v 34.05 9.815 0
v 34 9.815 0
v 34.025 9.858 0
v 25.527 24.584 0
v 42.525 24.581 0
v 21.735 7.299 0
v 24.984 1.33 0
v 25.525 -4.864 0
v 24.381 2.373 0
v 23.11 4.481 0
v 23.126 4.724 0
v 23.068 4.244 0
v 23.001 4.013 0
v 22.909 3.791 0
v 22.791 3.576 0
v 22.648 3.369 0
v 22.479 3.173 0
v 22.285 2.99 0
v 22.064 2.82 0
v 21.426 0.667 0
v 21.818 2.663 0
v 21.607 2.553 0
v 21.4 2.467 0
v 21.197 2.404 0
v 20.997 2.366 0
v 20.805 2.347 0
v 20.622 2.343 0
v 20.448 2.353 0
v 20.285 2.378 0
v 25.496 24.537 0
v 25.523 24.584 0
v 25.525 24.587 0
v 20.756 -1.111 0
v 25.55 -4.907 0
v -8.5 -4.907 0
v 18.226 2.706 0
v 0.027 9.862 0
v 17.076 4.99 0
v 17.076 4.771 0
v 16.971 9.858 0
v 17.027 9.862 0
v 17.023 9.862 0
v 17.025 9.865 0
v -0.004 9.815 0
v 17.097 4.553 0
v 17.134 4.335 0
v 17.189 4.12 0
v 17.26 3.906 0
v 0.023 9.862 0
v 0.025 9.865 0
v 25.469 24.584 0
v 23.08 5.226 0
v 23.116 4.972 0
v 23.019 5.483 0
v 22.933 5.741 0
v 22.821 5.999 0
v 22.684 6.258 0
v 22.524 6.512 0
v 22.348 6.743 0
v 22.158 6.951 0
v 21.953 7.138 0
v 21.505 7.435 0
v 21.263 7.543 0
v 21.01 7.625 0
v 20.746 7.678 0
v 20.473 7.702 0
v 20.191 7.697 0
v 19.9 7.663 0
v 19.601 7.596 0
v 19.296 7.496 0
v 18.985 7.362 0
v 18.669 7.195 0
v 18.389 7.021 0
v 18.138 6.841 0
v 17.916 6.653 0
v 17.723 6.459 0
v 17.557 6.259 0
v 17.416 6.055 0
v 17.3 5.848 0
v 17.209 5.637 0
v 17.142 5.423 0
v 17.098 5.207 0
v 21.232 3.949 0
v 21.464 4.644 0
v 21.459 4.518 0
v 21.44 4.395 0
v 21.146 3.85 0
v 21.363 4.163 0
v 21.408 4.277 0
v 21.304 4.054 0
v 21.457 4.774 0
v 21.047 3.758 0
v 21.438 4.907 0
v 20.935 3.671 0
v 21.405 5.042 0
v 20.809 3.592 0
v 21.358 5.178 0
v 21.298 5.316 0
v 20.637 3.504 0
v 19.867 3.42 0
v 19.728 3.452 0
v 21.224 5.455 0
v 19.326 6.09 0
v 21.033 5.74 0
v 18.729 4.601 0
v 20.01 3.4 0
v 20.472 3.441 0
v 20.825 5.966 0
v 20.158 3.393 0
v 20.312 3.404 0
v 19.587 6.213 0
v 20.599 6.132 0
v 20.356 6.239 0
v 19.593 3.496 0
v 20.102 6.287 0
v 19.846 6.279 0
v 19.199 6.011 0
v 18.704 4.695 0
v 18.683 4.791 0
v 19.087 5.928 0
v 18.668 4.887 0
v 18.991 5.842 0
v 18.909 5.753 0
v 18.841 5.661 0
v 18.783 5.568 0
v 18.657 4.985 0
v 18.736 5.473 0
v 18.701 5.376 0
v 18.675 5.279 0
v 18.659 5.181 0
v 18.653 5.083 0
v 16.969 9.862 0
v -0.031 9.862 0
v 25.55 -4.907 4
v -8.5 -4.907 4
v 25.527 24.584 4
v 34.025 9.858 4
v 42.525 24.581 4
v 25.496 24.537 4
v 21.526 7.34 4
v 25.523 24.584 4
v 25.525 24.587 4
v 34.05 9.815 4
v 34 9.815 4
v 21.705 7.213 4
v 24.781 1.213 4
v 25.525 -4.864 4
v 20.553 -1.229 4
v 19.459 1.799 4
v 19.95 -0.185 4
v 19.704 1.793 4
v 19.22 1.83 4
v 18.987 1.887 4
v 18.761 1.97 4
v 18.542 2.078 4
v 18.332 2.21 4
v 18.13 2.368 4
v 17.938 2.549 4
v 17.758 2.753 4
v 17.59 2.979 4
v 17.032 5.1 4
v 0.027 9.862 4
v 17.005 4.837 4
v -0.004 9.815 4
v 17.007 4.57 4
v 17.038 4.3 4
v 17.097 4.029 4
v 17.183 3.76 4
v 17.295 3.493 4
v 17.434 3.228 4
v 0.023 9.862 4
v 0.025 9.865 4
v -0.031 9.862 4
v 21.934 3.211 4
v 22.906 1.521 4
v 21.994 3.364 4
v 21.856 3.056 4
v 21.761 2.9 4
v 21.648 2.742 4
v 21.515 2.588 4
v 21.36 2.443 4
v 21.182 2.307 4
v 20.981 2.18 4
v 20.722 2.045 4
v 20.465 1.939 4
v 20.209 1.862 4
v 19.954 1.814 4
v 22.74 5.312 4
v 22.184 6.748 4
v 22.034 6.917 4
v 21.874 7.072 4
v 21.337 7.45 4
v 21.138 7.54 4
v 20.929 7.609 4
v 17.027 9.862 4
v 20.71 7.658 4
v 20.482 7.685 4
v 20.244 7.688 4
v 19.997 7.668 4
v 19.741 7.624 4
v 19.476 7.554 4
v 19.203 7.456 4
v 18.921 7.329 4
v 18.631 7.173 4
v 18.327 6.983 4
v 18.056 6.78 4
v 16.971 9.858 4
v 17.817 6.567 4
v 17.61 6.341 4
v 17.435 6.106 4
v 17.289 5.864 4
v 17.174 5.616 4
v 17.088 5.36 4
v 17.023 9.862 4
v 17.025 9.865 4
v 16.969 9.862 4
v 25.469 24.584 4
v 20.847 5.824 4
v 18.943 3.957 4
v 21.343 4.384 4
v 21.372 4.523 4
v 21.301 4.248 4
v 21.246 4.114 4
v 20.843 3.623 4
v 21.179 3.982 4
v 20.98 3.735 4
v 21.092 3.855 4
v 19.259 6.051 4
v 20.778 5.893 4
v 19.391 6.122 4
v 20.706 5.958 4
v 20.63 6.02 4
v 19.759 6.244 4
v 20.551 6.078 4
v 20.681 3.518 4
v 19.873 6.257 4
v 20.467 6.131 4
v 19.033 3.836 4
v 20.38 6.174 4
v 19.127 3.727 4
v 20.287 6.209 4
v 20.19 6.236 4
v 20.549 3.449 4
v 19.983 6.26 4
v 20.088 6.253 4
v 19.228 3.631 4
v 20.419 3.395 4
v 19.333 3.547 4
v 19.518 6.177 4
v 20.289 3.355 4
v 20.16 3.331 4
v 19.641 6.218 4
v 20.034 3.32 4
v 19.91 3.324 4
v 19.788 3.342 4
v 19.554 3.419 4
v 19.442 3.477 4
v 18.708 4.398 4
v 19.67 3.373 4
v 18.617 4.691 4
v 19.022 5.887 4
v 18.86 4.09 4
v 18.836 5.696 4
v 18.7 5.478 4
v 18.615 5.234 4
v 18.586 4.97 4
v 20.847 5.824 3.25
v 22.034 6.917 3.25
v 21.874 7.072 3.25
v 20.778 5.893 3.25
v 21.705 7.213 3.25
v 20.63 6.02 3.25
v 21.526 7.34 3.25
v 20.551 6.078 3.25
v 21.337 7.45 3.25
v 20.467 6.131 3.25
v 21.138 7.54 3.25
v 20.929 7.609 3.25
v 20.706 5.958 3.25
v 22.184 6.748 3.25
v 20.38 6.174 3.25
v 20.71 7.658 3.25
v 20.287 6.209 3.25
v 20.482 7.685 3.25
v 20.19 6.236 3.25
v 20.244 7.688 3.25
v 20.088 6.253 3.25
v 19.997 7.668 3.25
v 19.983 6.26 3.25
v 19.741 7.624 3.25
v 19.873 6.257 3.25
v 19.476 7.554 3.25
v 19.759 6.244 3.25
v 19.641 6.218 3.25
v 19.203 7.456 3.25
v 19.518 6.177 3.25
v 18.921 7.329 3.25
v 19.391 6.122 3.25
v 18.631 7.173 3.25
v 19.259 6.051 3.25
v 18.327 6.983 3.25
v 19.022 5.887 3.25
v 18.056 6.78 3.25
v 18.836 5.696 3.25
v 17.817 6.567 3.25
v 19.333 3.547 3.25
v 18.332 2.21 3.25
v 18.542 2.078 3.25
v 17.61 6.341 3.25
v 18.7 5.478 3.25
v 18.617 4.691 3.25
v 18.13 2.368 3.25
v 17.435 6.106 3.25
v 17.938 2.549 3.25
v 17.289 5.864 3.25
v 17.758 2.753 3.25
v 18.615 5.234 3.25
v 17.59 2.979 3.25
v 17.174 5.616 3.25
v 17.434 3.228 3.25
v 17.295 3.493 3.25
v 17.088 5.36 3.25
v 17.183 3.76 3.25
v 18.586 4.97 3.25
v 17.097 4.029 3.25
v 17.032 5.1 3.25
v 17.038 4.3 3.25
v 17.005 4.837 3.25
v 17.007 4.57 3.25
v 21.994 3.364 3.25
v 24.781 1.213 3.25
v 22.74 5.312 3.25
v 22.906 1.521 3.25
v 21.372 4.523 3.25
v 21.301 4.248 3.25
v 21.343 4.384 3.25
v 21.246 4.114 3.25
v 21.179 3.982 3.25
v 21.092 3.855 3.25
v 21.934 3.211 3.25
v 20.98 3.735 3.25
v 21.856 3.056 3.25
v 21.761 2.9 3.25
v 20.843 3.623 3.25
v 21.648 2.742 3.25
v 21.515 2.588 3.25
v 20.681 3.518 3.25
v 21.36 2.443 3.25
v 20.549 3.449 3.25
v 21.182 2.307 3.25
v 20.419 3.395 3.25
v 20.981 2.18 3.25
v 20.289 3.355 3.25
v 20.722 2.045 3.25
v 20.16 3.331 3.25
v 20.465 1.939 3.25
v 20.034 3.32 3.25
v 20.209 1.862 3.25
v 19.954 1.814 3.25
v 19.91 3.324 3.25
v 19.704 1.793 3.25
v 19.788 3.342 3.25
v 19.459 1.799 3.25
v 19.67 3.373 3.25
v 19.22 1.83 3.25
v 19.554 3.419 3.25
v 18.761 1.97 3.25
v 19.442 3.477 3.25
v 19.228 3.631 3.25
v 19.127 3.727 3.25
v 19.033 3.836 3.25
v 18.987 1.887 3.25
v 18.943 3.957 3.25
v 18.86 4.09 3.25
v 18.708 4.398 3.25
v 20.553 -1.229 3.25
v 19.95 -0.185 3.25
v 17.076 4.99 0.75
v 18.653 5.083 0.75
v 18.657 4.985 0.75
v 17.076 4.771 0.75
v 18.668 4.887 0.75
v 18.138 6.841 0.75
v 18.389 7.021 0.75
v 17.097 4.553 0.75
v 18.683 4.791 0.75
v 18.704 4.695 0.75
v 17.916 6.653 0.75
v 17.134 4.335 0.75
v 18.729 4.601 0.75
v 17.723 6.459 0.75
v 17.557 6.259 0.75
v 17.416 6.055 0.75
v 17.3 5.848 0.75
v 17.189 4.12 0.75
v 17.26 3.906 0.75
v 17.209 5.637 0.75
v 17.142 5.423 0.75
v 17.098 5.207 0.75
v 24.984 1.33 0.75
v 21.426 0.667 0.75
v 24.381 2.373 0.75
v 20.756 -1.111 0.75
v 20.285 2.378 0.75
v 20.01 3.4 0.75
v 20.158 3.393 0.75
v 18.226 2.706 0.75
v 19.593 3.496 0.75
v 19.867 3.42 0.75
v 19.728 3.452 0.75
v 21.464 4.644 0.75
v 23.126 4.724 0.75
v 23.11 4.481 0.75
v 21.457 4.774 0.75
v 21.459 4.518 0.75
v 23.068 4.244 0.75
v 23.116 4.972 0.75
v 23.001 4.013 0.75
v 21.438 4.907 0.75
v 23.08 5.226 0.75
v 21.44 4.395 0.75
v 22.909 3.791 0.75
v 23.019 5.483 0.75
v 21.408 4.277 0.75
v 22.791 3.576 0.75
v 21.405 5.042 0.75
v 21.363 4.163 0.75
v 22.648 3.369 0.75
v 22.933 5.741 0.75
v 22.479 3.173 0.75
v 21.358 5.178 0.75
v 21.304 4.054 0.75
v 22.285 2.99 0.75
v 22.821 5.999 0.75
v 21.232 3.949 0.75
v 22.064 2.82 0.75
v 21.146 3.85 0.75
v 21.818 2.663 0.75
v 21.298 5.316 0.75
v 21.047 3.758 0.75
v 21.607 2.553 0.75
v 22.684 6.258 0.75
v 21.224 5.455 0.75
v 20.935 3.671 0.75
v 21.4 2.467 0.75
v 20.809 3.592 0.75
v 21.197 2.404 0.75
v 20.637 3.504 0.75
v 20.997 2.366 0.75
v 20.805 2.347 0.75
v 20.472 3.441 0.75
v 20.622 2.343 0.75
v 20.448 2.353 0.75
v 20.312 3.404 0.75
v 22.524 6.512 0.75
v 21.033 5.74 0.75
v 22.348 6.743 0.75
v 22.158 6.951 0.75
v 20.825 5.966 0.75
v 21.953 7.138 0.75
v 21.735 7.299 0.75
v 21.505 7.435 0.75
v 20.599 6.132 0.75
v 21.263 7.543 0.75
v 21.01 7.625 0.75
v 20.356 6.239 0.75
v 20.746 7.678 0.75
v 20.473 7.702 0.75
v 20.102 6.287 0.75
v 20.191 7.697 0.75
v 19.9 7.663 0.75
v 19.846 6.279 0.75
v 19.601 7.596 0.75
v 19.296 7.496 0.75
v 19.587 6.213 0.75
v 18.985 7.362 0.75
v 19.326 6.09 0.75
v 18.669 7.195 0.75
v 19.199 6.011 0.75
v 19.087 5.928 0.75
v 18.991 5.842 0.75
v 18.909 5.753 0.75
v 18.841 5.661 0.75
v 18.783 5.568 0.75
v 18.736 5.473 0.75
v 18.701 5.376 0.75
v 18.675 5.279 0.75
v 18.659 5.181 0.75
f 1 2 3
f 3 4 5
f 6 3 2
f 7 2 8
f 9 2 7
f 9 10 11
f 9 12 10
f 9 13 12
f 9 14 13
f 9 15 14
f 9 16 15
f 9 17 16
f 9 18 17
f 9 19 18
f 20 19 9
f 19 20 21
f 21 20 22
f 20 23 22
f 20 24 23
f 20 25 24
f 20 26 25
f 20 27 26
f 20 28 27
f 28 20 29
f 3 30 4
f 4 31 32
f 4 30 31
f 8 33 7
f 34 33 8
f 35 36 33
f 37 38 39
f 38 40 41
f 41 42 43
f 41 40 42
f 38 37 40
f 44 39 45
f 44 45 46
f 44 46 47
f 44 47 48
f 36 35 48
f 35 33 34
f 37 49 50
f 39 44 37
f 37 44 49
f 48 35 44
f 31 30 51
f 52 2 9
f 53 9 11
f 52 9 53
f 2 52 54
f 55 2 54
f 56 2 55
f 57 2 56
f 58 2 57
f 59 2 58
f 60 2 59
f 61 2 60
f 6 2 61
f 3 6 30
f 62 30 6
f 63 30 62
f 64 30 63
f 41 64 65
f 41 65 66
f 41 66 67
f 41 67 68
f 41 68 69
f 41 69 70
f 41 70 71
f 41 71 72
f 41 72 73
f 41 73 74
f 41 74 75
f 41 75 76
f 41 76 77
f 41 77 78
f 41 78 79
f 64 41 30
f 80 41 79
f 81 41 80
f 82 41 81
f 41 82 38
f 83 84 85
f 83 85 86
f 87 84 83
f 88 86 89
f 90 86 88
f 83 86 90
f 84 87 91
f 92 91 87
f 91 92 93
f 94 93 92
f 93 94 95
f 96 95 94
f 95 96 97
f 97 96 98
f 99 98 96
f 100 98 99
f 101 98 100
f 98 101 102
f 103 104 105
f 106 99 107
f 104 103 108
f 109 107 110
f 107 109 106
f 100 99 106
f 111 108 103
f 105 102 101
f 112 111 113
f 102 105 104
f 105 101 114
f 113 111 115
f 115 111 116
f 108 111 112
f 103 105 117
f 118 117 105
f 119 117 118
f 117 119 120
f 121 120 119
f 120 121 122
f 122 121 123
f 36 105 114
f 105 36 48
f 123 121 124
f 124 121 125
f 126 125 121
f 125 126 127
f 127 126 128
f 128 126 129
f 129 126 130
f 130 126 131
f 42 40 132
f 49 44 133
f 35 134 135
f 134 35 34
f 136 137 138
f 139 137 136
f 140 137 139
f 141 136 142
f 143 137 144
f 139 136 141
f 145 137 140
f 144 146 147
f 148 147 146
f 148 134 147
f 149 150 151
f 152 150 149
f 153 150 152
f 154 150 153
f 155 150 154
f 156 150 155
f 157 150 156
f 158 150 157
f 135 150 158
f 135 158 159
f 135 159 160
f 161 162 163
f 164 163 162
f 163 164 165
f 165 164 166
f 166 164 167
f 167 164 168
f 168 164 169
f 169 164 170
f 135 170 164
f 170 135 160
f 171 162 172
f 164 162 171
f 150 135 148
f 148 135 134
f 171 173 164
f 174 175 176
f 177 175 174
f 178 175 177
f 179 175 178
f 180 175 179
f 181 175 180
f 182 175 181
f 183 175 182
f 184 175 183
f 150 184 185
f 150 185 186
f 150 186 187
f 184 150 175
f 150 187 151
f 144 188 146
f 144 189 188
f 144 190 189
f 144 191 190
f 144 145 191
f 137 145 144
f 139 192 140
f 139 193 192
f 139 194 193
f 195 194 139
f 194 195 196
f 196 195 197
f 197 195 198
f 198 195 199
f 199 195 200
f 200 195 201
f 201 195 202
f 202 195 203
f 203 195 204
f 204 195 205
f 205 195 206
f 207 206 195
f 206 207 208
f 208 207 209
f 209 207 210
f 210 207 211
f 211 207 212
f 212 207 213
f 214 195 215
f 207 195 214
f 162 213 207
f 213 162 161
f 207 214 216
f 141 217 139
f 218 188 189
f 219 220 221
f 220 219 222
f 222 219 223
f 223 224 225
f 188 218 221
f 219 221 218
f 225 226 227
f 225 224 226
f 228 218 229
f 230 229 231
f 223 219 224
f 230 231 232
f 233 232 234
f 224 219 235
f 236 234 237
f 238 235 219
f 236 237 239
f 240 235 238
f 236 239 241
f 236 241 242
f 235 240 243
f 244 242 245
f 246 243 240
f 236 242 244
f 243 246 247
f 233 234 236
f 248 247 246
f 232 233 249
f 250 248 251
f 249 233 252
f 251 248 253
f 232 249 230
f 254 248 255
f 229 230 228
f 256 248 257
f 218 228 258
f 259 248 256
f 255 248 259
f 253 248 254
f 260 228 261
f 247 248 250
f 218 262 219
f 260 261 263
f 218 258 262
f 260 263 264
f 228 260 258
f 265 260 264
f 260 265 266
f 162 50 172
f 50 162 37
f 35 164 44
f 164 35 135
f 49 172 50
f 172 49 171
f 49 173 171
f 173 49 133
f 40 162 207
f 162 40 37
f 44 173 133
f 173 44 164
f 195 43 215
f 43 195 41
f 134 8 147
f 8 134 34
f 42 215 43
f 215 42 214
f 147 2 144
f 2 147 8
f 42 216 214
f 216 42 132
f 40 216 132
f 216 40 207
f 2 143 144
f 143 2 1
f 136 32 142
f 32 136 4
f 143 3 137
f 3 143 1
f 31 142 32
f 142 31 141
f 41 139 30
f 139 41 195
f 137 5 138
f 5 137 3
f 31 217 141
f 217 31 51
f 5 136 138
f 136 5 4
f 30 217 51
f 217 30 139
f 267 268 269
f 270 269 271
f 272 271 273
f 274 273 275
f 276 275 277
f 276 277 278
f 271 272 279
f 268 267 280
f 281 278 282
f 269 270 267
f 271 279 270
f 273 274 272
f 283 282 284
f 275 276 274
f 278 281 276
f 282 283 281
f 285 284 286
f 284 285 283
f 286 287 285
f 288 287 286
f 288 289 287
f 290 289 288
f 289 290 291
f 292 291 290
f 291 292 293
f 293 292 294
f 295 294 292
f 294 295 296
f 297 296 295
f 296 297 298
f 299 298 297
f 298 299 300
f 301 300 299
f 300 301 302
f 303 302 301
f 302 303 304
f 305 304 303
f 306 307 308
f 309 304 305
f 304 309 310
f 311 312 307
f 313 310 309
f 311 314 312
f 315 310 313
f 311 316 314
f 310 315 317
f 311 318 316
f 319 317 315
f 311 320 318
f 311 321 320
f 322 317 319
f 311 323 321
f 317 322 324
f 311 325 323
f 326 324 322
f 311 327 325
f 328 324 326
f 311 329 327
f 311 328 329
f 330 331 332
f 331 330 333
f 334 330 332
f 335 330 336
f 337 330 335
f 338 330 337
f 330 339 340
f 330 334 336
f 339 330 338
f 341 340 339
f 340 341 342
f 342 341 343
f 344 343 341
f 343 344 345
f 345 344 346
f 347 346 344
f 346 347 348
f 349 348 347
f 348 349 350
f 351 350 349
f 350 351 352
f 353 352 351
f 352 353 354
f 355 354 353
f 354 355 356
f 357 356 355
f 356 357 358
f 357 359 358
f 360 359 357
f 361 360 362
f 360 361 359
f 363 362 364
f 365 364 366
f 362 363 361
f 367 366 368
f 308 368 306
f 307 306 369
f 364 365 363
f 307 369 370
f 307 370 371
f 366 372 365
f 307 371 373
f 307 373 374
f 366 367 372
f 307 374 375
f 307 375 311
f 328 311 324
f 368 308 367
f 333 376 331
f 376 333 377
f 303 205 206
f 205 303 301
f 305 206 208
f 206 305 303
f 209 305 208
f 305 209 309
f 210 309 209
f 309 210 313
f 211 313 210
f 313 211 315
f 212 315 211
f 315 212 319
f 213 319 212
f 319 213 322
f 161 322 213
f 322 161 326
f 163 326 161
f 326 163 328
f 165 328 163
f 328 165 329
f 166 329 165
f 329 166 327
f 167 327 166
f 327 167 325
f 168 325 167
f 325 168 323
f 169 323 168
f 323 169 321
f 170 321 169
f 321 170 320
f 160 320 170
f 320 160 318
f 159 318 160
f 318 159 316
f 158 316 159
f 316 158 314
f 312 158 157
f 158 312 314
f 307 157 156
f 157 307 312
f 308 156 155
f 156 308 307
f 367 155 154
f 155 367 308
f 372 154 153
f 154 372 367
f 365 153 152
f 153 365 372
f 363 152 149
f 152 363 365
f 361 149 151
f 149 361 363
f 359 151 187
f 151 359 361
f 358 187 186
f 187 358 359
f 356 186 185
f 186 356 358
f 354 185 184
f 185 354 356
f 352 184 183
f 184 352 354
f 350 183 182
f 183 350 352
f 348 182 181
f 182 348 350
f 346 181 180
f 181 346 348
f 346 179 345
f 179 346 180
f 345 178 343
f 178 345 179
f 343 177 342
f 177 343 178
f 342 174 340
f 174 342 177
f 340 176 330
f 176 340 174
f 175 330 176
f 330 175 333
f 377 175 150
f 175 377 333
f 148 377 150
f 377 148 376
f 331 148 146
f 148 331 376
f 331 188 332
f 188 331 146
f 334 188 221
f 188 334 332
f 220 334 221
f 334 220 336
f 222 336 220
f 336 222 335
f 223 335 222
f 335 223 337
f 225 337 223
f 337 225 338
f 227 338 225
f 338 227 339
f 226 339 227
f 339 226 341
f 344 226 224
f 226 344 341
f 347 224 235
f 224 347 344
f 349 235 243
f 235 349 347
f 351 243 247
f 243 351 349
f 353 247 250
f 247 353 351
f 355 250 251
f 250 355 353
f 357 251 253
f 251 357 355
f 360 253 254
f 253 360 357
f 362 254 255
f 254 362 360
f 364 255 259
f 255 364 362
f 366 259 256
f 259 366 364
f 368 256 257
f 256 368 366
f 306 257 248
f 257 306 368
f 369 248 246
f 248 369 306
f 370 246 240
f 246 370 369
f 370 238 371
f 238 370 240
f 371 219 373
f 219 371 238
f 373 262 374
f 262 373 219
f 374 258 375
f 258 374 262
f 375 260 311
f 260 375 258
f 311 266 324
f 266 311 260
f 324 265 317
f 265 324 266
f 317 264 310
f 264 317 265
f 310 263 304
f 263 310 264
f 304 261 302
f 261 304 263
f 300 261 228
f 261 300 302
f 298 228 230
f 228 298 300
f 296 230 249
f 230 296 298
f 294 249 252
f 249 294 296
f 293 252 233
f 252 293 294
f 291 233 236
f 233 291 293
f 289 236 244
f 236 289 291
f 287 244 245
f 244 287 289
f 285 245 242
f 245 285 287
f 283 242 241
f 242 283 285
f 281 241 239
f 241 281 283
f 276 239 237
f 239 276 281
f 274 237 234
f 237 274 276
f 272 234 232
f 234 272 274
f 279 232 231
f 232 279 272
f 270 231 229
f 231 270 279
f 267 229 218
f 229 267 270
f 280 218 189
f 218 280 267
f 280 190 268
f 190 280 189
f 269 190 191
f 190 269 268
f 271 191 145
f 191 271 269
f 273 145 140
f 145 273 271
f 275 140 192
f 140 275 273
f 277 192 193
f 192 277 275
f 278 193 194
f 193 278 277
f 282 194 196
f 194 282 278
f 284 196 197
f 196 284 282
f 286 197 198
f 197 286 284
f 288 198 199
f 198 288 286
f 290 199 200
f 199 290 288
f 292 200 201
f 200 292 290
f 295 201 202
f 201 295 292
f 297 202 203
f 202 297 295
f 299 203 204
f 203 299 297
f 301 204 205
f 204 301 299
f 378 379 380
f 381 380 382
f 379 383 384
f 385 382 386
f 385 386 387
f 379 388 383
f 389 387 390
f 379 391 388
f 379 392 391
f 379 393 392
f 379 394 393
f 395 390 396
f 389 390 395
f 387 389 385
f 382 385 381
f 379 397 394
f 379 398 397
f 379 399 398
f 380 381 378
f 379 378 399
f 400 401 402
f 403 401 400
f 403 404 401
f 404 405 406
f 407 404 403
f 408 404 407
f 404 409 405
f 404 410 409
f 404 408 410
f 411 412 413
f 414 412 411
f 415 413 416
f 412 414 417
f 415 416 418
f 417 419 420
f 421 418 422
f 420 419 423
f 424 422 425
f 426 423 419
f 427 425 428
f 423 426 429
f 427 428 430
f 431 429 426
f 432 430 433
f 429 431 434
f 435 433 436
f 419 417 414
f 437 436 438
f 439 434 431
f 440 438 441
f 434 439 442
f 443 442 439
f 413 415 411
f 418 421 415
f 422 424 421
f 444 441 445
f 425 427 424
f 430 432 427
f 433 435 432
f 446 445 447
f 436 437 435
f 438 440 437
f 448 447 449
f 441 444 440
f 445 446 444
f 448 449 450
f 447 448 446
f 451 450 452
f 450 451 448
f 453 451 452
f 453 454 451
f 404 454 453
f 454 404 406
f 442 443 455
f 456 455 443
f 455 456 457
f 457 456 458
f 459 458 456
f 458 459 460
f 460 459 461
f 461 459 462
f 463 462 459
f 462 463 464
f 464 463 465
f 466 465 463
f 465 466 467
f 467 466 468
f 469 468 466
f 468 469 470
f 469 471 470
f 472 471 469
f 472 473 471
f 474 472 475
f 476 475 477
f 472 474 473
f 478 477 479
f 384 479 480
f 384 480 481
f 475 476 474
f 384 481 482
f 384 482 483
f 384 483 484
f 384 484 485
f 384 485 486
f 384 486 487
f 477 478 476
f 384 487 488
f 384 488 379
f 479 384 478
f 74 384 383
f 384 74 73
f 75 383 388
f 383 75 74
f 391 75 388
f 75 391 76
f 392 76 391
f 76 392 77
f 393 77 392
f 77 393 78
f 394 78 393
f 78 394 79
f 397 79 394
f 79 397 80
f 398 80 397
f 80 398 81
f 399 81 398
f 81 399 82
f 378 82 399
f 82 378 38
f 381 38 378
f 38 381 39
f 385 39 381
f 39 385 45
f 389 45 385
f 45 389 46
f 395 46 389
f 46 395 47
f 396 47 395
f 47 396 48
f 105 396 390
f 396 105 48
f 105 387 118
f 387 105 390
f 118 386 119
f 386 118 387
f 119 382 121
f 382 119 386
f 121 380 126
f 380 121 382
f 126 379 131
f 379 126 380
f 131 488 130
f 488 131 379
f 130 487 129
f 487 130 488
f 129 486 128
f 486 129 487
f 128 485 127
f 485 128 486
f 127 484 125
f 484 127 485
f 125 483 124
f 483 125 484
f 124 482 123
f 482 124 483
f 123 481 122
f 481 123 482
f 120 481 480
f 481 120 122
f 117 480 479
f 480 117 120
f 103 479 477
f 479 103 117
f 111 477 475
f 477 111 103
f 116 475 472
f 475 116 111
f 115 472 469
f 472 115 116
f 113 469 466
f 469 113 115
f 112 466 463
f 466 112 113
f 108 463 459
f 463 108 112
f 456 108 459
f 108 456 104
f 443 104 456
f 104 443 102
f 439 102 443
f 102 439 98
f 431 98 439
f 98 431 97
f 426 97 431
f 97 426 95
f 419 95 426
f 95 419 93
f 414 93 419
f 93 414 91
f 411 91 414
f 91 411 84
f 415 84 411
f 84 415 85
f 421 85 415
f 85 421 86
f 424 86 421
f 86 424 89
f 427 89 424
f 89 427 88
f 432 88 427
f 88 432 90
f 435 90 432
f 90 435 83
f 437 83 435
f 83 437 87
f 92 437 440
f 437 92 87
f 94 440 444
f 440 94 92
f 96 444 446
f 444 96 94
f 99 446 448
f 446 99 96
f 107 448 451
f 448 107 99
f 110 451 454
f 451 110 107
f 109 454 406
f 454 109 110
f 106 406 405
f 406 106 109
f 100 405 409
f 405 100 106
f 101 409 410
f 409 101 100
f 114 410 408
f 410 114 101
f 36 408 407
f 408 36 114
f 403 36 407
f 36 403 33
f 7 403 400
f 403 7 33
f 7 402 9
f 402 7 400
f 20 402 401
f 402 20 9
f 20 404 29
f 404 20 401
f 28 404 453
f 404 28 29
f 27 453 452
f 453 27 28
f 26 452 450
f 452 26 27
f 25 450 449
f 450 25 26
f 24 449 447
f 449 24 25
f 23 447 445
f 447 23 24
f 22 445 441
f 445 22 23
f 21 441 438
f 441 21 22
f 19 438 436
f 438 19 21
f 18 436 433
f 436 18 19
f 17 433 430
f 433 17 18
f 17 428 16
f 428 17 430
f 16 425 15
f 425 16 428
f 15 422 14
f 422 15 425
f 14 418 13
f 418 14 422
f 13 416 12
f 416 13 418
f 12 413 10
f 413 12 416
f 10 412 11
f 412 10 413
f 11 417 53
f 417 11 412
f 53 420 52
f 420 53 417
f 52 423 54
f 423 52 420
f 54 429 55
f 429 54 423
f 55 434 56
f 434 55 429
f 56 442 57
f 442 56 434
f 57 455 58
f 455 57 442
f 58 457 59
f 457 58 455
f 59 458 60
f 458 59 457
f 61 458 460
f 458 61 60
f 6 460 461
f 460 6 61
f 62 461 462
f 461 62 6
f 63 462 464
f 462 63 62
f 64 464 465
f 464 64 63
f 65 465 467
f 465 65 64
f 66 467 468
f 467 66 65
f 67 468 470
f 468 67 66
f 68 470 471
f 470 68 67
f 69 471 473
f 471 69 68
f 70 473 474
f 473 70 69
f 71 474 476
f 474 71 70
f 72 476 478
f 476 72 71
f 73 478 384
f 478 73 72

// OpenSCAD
// expects parameter N of <1,7>
// example use: "c:\Program Files\OpenSCAD\openscad.com" -o stl\tile_3.stl -D "N=3" cmdline_element.scad

/* config */
height = 4;
halfsize = 17 / 2;
fontHeight = 0.8;
fontFactor = 1;
eps = 0.05;

/* request */
N = 5;

if (N == 0) {
    test_tile();
}
if (N == 1) {
    tile1();
} else if (N == 2) {
    tile2();
} else if (N == 3) {
    tile3();
} else if (N == 4) {
    tile4();
} else if (N == 5) {
    tile5();
} else if (N == 6) {
    tile6();
} else if (N == 7) {
    tile7();
}


/* code */
fontSize = halfsize * fontFactor;
yDim = sqrt(3) * halfsize;
yShift = yDim / 3;



module triangle() {
    translate([-halfsize, -yShift, 0])            
    linear_extrude(height)
        polygon(points=[[0,0],[2*halfsize + eps,0],[halfsize + eps / 2, yDim + eps]]);
    
}

module test_tile() { //brown
    triangle();
    text("0", font = "Liberation Sans:style=Bold", size = fontSize, halign = "center", valign = "center");
}

module number(trans = [0,0,0], rot = 0, num = 0) {
    
    translate([0,0,height -fontHeight + eps]) translate(trans) rotate([0,0,rot]) linear_extrude(fontHeight)
         text(num, font = "Liberation Sans:style=Bold", size = fontSize, halign = "center", valign = "center"); 

    translate([0,0,- eps]) translate(trans) rotate([0,0,rot]) linear_extrude(fontHeight) mirror([1,0,0])
         text(num, font = "Liberation Sans:style=Bold", size = fontSize, halign = "center", valign = "center"); 
}

module tile1() { //brown
    difference() {
        union() {
            translate([   -halfsize, yShift, 0]) rotate([0, 0, 60]) triangle();
            translate([           0,      0, 0]) rotate([0, 0,  0]) triangle();
            translate([    halfsize, yShift, 0]) rotate([0, 0, 60]) triangle();
            translate([2 * halfsize,      0, 0]) rotate([0, 0,  0]) triangle();
            translate([halfsize, yDim, 0]) rotate([0, 0,  0]) triangle();
            translate([2 * halfsize, yShift + yDim, 0]) rotate([0, 0, 60]) triangle();
        }

        // translate([halfsize, yShift, height - fontHeight + eps]) rotate([0,0, 90]) linear_extrude(fontHeight)
        //     text("1", font = "Liberation Sans:style=Bold", size = fontSize, halign = "center", valign = "center");        
        number([halfsize, yShift, 0], 90, "1");
    }
    
}
module tile2() { //violet
    difference() {
        union() {
            translate([           0,      0, 0]) rotate([0, 0,  0]) triangle();
            translate([    halfsize, yShift, 0]) rotate([0, 0, 60]) triangle();
            translate([2 * halfsize,      0, 0]) rotate([0, 0,  0]) triangle();
            translate([3 * halfsize, yShift, 0]) rotate([0, 0, 60]) triangle();
            translate([3 * halfsize,   yDim, 0]) rotate([0, 0,  0]) triangle();
            translate([2 * halfsize, yShift + yDim, 0]) rotate([0, 0, 60]) triangle();
        }
        // translate([2.75 * halfsize, 1.5 *yShift, height - fontHeight + eps]) rotate([0,0, 270]) linear_extrude(fontHeight)
        //     text("2", font = "Liberation Sans:style=Bold", size = fontSize, halign = "center", valign = "center");
        number([2.75 * halfsize, 1.5 *yShift, 0], 270, "2");
    }
}
module tile3() { //sand
    difference() {
        union() {

            translate([    halfsize, yShift, 0]) rotate([0, 0, 60]) triangle();
            translate([2 * halfsize,      0, 0]) rotate([0, 0,  0]) triangle();
            translate([3 * halfsize, yShift, 0]) rotate([0, 0, 60]) triangle();
            translate([3 * halfsize,   yDim, 0]) rotate([0, 0,  0]) triangle();
            translate([4 * halfsize, yShift + yDim, 0]) rotate([0, 0, 60]) triangle();
            translate([5 * halfsize,   yDim, 0]) rotate([0, 0,  0]) triangle();
        }

        // translate([3 * halfsize, 2 * yShift, height - fontHeight + eps]) rotate([0,0, 315]) linear_extrude(fontHeight)
        //     text("3", font = "Liberation Sans:style=Bold", size = fontSize, halign = "center", valign = "center");
        number([3 * halfsize, 2 * yShift, 0], 315, "3");
    }
}
module tile4() { //yellow
    difference() {
        union() {

            translate([   -halfsize, yShift, 0]) rotate([0, 0, 60]) triangle();
            translate([           0,      0, 0]) rotate([0, 0,  0]) triangle();
            translate([    halfsize, yShift, 0]) rotate([0, 0, 60]) triangle();
            translate([2 * halfsize,      0, 0]) rotate([0, 0,  0]) triangle();
            translate([3 * halfsize, yShift, 0]) rotate([0, 0, 60]) triangle();
            translate([3 * halfsize,   yDim, 0]) rotate([0, 0,  0]) triangle();
        }

        // translate([ halfsize, yShift / 2, height - fontHeight + eps]) rotate([0,0, 0]) linear_extrude(fontHeight)
        //     text("4", font = "Liberation Sans:style=Bold", size = fontSize, halign = "center", valign = "center");
        number([ halfsize, yShift / 2, 0], 0, "4");
    }
}
module tile5() { //green
    difference() {
        union() {
            translate([           0,      0, 0]) rotate([0, 0,  0]) triangle();
            translate([    halfsize, yShift, 0]) rotate([0, 0, 60]) triangle();
            translate([2 * halfsize,      0, 0]) rotate([0, 0,  0]) triangle();
            translate([3 * halfsize, yShift, 0]) rotate([0, 0, 60]) triangle();
            translate([3 * halfsize,   yDim, 0]) rotate([0, 0,  0]) triangle();
            translate([4 * halfsize, yShift + yDim, 0]) rotate([0, 0, 60]) triangle();
        }

        // translate([2.5 * halfsize - 0.12 * yShift, 0.754 *yShift, height - fontHeight + eps]) rotate([0,0, 210]) linear_extrude(fontHeight)
        //         text("5", font = "Liberation Sans:style=Bold", size = fontSize, halign = "center", valign = "center");
        number([2.5 * halfsize - 0.12 * yShift, 0.754 *yShift, 0], 210, "5");
    }
}
module tile6() { //green
    difference() {
        union() {
            translate([   -halfsize,     yShift, 0]) rotate([0, 0, 60]) triangle();
            translate([           0,          0, 0]) rotate([0, 0,  0]) triangle();
            translate([    halfsize,     yShift, 0]) rotate([0, 0, 60]) triangle();
            translate([2 * halfsize,          0, 0]) rotate([0, 0,  0]) triangle();
            translate([3 * halfsize,     yShift, 0]) rotate([0, 0, 60]) triangle();
            translate([2 * halfsize, -2 *yShift, 0]) rotate([0, 0, 60]) triangle();
        }

        // translate([2 * halfsize, 0.5 *yShift, height - fontHeight + eps]) rotate([0,0, 270]) linear_extrude(fontHeight)
        //         text("6", font = "Liberation Sans:style=Bold", size = fontSize, halign = "center", valign = "center");
        number([2 * halfsize, 0.5 *yShift, 0], 270, "6");
    }
}
module tile7() { //blue
    difference() {
        union() {
            translate([           0,      0, 0]) rotate([0, 0,  0]) triangle();
            translate([    halfsize, yShift, 0]) rotate([0, 0, 60]) triangle();
            translate([2 * halfsize,      0, 0]) rotate([0, 0,  0]) triangle();
            translate([3 * halfsize, yShift, 0]) rotate([0, 0, 60]) triangle();
            translate([3 * halfsize,   yDim, 0]) rotate([0, 0,  0]) triangle();
            translate([    halfsize,   yDim, 0]) rotate([0, 0,  0]) triangle();
        }

        // translate([1.5 * halfsize, 0.5 *yShift, height - fontHeight + eps]) rotate([0,0, 270]) linear_extrude(fontHeight)
        //         text("7", font = "Liberation Sans:style=Bold", size = fontSize, halign = "center", valign = "center");
        number([1.5 * halfsize, 0.5 *yShift, 0], 270, "7");
    }
}
